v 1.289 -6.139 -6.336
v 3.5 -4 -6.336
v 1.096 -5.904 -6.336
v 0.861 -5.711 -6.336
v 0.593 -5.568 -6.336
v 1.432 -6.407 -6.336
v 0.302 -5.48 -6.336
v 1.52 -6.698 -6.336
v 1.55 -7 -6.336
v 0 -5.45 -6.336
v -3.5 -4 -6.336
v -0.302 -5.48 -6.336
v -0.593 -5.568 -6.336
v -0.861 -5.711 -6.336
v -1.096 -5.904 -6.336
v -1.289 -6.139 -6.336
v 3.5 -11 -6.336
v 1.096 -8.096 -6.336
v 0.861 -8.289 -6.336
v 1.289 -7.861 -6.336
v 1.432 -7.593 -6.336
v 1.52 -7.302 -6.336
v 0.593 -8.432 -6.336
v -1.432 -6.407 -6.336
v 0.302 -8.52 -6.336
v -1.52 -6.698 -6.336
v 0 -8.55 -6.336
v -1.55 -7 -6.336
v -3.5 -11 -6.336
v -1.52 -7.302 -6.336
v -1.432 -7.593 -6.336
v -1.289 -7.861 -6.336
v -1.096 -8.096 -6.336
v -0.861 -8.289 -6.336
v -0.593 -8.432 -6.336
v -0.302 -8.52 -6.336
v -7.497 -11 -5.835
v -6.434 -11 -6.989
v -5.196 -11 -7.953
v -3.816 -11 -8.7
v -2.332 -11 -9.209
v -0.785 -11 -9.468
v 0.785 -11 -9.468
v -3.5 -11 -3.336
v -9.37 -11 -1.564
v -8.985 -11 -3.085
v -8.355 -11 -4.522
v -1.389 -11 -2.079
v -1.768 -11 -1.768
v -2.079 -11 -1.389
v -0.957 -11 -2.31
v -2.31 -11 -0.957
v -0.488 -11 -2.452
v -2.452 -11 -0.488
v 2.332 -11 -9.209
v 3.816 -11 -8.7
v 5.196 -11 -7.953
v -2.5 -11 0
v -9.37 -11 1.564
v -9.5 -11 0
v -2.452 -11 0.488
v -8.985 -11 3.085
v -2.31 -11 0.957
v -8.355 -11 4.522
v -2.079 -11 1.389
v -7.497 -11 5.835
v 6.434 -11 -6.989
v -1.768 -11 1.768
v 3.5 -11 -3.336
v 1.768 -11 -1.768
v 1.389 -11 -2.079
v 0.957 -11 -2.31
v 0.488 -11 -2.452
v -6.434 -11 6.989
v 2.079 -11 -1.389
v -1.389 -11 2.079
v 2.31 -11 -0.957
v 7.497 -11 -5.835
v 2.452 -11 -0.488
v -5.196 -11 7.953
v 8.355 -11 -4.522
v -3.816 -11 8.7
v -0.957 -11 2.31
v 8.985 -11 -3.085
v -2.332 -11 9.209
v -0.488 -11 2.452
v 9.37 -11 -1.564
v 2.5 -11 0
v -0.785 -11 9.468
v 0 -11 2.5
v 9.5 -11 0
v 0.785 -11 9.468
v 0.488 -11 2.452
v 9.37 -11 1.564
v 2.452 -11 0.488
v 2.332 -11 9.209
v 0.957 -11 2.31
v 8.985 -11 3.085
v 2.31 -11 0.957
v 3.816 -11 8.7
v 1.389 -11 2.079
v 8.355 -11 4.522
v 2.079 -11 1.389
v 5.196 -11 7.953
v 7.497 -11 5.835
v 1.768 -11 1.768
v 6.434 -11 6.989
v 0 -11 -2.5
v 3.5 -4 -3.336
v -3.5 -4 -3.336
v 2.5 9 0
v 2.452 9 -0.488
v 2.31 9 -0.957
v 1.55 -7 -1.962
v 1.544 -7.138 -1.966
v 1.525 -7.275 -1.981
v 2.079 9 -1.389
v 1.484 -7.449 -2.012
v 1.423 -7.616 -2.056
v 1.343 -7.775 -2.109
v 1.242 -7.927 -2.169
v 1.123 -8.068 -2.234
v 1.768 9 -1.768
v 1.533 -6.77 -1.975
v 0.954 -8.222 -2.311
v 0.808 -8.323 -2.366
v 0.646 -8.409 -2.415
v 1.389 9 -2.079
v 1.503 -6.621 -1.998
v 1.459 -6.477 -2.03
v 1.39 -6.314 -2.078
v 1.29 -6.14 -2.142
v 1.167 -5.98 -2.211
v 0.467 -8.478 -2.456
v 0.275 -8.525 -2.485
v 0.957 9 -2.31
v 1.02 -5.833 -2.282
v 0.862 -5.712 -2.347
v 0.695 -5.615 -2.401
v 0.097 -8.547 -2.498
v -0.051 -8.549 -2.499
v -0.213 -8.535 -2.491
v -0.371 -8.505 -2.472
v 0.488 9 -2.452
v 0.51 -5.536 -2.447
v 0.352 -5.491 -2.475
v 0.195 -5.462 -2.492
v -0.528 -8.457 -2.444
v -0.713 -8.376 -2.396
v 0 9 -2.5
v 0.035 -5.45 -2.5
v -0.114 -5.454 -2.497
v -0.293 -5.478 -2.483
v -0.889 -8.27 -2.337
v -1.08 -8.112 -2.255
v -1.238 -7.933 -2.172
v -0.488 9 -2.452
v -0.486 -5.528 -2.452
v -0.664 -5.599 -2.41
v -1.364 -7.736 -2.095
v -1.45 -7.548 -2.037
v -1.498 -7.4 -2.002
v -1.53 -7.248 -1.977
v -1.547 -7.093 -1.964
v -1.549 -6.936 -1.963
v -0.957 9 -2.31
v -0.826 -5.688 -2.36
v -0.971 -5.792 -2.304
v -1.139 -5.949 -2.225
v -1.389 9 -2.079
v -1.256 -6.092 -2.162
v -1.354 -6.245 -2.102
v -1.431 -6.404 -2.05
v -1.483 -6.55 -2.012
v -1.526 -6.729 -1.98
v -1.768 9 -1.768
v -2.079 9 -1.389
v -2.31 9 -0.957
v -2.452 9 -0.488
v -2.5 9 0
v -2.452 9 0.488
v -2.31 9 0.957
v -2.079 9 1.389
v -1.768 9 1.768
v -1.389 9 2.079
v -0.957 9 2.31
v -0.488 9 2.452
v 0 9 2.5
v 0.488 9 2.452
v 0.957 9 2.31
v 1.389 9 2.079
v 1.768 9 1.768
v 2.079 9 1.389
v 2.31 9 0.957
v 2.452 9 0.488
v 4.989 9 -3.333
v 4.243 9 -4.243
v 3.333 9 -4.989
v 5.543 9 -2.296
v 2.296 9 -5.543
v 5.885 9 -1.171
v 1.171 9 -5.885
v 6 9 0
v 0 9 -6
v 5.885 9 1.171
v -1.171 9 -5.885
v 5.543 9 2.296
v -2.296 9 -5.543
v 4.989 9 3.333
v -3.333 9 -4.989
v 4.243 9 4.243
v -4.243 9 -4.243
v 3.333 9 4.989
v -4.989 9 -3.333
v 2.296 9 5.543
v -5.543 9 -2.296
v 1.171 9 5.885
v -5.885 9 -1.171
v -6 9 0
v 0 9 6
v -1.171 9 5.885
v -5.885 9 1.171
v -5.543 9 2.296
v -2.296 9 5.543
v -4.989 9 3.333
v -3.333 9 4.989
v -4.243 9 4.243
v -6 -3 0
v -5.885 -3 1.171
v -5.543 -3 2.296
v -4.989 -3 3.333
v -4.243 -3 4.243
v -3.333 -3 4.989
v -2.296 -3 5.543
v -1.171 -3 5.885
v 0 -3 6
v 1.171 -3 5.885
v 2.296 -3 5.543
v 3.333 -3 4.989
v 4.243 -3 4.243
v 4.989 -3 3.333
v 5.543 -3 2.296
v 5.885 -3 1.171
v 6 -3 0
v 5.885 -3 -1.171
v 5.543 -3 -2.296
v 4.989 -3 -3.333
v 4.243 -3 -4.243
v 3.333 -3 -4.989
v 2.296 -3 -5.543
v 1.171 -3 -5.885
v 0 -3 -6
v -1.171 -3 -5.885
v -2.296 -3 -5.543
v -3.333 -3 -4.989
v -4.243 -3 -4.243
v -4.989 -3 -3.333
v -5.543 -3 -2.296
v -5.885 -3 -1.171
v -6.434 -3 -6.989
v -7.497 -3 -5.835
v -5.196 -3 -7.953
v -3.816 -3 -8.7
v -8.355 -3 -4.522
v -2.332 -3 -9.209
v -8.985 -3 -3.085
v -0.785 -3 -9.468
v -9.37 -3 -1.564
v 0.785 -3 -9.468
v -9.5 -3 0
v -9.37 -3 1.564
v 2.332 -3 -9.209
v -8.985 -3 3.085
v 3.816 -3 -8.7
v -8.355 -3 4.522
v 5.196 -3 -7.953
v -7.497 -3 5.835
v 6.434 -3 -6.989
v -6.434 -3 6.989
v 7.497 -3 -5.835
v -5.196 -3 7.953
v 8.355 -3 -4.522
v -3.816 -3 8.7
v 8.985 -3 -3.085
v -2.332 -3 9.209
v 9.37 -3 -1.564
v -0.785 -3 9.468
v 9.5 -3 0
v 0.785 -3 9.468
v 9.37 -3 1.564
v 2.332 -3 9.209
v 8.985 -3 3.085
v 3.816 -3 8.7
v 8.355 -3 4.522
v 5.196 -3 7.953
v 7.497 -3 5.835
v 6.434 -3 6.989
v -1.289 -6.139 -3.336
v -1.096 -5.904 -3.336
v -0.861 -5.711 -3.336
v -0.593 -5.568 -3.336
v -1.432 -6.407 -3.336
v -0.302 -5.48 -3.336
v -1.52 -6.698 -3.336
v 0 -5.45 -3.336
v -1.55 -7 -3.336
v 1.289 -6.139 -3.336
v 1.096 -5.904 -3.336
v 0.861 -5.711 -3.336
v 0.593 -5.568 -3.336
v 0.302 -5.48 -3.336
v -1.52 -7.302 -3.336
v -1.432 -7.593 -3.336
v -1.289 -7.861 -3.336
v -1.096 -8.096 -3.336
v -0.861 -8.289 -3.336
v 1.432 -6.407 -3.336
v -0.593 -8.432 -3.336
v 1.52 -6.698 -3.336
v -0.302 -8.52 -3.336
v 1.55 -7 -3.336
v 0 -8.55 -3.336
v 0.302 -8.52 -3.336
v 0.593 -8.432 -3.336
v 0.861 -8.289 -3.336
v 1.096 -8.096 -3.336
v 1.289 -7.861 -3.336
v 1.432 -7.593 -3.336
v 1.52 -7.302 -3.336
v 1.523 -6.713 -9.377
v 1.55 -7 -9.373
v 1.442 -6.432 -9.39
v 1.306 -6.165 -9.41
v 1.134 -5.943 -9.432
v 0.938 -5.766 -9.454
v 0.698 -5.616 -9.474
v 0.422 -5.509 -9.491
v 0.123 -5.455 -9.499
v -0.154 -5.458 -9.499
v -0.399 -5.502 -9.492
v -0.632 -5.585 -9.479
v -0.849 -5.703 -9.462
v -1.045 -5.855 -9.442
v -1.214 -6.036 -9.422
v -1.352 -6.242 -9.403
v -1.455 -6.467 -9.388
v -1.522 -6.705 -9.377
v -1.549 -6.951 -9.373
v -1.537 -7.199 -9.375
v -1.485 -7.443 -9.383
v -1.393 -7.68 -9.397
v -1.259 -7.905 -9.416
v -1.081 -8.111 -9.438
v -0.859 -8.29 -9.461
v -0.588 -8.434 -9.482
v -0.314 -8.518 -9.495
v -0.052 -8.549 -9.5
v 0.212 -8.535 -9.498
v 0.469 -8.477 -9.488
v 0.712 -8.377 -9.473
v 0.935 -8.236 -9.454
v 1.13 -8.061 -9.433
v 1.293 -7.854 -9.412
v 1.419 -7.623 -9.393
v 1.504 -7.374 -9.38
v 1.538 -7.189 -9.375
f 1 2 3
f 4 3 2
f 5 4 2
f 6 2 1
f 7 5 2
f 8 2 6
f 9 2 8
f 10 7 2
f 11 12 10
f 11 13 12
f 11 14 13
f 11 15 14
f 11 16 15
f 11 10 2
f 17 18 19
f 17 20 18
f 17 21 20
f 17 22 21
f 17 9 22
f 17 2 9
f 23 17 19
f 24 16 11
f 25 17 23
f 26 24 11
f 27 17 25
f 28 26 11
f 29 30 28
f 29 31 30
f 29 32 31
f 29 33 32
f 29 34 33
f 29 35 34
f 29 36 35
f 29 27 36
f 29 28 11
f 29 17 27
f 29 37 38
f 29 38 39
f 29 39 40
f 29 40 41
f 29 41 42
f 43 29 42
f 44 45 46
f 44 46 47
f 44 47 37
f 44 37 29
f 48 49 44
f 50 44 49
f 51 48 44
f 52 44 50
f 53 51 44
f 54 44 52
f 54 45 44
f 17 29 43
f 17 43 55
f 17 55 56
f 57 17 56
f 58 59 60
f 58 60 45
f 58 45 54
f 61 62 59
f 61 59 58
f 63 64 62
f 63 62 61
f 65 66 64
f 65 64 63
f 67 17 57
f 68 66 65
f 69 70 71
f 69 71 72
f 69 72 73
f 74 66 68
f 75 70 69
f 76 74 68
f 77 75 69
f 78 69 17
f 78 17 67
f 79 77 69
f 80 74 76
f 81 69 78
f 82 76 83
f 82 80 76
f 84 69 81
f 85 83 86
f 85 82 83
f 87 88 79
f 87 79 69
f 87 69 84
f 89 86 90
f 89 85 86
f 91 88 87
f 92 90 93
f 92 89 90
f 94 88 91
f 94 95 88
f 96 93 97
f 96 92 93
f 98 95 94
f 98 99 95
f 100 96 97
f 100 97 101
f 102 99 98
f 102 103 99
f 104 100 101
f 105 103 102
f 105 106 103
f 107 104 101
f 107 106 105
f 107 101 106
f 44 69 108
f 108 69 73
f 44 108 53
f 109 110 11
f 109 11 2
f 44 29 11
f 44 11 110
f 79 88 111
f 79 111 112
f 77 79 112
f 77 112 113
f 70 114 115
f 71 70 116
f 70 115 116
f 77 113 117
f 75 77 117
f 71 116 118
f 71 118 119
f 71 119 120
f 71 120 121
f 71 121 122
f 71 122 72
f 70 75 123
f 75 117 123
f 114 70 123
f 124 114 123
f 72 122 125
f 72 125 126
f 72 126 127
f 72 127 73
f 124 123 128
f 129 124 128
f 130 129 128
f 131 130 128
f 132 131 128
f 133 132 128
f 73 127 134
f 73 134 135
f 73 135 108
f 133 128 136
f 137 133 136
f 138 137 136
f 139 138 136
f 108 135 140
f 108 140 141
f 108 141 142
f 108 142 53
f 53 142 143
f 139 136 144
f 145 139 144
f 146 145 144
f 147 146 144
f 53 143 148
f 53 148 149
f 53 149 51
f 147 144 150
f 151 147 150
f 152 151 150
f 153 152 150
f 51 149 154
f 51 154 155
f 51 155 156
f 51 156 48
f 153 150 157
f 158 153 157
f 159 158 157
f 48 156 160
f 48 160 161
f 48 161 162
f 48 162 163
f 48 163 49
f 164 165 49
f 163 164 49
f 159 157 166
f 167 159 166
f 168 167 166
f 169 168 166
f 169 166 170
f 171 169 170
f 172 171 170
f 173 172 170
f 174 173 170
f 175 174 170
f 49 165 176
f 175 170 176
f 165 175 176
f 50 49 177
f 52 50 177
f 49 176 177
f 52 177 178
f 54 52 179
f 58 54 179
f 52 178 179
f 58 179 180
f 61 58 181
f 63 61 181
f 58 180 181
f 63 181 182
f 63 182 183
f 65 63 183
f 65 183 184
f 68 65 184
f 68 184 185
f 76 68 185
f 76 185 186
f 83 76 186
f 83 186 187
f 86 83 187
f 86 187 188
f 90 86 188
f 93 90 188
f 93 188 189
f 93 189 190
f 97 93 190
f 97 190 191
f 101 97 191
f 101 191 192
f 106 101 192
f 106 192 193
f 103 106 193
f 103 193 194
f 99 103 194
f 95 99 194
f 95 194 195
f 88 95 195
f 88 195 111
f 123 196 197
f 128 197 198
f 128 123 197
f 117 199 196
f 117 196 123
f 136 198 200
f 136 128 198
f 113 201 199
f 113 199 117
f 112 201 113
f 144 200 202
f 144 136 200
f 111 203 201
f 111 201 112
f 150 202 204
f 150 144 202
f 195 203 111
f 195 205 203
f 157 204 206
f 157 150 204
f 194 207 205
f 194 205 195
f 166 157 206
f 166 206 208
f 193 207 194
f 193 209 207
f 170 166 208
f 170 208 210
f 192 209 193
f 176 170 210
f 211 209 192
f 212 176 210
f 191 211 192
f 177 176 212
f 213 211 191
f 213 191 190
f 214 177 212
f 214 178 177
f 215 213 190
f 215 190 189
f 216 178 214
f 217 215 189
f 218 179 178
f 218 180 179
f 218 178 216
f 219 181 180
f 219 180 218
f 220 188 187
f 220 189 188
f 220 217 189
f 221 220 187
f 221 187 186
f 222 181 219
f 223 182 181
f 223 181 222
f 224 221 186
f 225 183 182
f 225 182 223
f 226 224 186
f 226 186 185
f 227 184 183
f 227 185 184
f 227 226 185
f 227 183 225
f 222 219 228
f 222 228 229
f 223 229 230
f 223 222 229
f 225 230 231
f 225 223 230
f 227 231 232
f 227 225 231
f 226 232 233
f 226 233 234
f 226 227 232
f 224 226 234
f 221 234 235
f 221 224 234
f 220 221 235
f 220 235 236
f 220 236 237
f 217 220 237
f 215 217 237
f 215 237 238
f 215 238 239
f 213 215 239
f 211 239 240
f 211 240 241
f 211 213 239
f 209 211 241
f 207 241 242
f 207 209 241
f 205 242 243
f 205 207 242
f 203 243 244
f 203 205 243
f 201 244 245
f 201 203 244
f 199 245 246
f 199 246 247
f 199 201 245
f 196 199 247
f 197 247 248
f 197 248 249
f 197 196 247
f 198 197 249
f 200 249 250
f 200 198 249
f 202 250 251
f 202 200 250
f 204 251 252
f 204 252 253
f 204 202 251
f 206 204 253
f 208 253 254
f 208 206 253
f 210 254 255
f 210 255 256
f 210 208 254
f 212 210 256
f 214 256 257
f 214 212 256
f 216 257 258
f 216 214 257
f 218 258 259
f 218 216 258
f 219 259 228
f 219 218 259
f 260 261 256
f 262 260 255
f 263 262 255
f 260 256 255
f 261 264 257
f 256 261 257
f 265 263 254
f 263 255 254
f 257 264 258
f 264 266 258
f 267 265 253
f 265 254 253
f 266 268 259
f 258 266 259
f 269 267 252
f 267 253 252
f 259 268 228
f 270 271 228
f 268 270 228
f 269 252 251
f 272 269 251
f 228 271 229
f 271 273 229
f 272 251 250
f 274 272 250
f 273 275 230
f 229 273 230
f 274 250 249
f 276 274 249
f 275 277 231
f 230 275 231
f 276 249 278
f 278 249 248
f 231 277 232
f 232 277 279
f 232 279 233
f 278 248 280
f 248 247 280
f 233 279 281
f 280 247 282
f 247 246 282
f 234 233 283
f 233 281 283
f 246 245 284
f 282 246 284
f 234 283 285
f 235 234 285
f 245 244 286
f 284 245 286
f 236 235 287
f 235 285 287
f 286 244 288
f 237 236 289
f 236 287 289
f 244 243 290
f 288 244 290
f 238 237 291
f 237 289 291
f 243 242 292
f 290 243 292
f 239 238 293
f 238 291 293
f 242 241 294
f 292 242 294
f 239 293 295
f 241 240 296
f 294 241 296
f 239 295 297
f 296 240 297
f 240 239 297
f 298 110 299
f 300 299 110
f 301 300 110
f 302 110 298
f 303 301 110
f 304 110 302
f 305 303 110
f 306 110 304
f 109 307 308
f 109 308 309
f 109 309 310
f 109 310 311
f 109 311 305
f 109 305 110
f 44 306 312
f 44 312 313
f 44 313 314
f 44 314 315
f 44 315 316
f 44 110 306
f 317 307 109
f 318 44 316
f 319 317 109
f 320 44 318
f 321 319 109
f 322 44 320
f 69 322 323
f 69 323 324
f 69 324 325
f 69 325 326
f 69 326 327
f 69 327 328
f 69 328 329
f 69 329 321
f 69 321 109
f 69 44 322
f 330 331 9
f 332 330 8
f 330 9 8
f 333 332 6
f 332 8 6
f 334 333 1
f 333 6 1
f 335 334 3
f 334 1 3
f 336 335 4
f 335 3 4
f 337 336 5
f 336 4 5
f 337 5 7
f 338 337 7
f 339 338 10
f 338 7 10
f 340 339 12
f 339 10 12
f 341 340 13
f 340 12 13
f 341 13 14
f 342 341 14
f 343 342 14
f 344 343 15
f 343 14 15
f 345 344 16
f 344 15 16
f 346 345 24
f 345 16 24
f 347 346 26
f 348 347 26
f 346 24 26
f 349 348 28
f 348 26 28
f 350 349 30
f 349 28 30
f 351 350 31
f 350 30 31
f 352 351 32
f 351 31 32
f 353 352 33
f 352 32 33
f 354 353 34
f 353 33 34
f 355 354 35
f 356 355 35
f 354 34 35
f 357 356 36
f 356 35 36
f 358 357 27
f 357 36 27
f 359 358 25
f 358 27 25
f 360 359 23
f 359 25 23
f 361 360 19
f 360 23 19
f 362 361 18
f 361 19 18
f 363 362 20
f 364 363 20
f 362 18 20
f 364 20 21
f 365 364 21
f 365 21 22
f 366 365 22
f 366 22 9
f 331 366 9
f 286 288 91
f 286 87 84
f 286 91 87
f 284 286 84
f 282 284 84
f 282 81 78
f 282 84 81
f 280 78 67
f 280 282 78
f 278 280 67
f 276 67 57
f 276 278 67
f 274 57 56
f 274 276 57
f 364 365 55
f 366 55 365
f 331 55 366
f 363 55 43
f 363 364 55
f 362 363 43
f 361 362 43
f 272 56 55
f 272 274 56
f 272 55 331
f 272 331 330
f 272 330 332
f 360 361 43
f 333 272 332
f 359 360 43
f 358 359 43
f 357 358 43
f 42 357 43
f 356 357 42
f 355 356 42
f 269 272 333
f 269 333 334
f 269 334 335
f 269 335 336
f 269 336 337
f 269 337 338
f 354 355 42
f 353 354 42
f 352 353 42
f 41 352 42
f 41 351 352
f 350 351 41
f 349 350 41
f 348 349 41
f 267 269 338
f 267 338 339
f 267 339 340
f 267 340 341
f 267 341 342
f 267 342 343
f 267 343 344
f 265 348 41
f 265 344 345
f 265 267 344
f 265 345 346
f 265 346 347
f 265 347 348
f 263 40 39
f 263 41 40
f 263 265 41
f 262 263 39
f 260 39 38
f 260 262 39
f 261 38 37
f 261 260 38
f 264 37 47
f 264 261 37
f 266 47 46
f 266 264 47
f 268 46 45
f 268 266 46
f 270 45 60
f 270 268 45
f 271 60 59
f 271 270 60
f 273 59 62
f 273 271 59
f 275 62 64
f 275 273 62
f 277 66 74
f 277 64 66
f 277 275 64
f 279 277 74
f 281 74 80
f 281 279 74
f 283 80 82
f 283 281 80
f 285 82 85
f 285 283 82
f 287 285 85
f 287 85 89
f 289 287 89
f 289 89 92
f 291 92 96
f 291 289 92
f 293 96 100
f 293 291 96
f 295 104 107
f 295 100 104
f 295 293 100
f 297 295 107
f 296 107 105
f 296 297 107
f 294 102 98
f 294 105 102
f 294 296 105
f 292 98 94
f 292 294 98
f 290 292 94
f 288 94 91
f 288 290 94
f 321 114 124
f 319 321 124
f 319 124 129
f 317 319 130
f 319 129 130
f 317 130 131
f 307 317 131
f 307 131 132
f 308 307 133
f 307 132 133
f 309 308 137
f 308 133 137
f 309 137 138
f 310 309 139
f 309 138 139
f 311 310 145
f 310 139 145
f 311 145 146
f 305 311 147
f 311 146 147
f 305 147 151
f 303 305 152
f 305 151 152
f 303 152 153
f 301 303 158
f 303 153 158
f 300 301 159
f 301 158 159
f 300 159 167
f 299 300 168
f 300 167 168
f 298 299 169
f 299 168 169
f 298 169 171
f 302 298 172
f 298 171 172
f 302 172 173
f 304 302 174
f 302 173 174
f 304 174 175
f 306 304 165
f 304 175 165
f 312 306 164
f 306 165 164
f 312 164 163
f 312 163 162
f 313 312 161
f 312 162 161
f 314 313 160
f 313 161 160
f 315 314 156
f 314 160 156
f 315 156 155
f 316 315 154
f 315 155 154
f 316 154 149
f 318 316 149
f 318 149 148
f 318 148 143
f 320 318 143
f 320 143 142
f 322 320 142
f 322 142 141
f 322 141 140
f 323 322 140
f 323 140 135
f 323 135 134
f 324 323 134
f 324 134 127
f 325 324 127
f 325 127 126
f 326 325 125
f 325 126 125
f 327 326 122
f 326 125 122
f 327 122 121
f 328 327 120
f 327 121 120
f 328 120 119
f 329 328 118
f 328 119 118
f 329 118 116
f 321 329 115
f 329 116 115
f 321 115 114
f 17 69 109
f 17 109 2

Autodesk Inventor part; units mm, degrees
ref_plane "YZ Plane" through (0, 0, 0) normal (1, 0, 0) x (0, 1, 0)
ref_plane "XZ Plane" through (0, 0, 0) normal (0, 1, 0) x (-1, 0, 0)
ref_plane "XY Plane" through (0, 0, 0) normal (0, 0, 1) x (1, 0, 0)
sketch "Sketch1" plane through (0, 0, 0) normal (0, 1, 0) x (-1, 0, 0)
  circle A0 centre (0, 0) radius 6
  dimension "d0" = 12
extrude "Extrusion1" add sketch "Sketch1" along normal blind 9 and the other way blind 3
sketch "Sketch2" plane through (0, -3, 0) normal (0, -1, 0) x (1, 0, 0)
  circle A0 centre (0, 0) radius 9.5
  dimension "d3" = 19
extrude "Extrusion2" add sketch "Sketch2" along normal blind 8
sketch "Sketch7" plane through (0, 0, 0) normal (0, 0, 1) x (1, 0, 0)
  point P0 (0, 0)
sketch "Sketch9" plane through (0, 0, 0) normal (0, 0, 1) x (1, 0, 0)
  circle A0 centre (0, -7) radius 1.55
  line L0 (-9.5, -11) -> (9.5, -11) projected
  line L1 (0, -11) -> (0, -3)
  line L2 (0, -11) -> (0, -3)
  line L3 (-6, -3) -> (6, -3) projected
  point P0 (0, 0)
  point P1 (0, -7)
  dimension "d22" = 3.1
extrude "Extrusion8" cut sketch "Sketch9" against normal up to next
sketch "Sketch10" plane through (0, 9, 0) normal (0, 1, 0) x (1, 0, 0)
  circle A0 centre (0, 0) radius 2.5
  dimension "d26" = 5
extrude "Extrusion9" cut sketch "Sketch10" against normal through all
sketch "Sketch11" plane through (0, -11, 0) normal (0, -1, 0) x (1, 0, 0)
  line L0 (3.5, -6.3359) -> (-3.5, -6.3359)
  line L1 (-3.5, -6.3359) -> (-3.5, -3.3359)
  line L2 (-3.5, -3.3359) -> (3.5, -3.3359)
  line L3 (3.5, -3.3359) -> (3.5, -6.3359)
  circle A0 centre (0, 0) radius 9.5 projected
  circle A1 centre (0, 0) radius 2.5 projected
  point P0 (0, -3.3359)
  dimension "d29" = 7
  dimension "d30" = 3
extrude "Extrusion10" cut sketch "Sketch11" against normal blind 7 contours L0 L1 L2 L3
properties part number "штука от моторчика2015" material "Bronze, Cast"
